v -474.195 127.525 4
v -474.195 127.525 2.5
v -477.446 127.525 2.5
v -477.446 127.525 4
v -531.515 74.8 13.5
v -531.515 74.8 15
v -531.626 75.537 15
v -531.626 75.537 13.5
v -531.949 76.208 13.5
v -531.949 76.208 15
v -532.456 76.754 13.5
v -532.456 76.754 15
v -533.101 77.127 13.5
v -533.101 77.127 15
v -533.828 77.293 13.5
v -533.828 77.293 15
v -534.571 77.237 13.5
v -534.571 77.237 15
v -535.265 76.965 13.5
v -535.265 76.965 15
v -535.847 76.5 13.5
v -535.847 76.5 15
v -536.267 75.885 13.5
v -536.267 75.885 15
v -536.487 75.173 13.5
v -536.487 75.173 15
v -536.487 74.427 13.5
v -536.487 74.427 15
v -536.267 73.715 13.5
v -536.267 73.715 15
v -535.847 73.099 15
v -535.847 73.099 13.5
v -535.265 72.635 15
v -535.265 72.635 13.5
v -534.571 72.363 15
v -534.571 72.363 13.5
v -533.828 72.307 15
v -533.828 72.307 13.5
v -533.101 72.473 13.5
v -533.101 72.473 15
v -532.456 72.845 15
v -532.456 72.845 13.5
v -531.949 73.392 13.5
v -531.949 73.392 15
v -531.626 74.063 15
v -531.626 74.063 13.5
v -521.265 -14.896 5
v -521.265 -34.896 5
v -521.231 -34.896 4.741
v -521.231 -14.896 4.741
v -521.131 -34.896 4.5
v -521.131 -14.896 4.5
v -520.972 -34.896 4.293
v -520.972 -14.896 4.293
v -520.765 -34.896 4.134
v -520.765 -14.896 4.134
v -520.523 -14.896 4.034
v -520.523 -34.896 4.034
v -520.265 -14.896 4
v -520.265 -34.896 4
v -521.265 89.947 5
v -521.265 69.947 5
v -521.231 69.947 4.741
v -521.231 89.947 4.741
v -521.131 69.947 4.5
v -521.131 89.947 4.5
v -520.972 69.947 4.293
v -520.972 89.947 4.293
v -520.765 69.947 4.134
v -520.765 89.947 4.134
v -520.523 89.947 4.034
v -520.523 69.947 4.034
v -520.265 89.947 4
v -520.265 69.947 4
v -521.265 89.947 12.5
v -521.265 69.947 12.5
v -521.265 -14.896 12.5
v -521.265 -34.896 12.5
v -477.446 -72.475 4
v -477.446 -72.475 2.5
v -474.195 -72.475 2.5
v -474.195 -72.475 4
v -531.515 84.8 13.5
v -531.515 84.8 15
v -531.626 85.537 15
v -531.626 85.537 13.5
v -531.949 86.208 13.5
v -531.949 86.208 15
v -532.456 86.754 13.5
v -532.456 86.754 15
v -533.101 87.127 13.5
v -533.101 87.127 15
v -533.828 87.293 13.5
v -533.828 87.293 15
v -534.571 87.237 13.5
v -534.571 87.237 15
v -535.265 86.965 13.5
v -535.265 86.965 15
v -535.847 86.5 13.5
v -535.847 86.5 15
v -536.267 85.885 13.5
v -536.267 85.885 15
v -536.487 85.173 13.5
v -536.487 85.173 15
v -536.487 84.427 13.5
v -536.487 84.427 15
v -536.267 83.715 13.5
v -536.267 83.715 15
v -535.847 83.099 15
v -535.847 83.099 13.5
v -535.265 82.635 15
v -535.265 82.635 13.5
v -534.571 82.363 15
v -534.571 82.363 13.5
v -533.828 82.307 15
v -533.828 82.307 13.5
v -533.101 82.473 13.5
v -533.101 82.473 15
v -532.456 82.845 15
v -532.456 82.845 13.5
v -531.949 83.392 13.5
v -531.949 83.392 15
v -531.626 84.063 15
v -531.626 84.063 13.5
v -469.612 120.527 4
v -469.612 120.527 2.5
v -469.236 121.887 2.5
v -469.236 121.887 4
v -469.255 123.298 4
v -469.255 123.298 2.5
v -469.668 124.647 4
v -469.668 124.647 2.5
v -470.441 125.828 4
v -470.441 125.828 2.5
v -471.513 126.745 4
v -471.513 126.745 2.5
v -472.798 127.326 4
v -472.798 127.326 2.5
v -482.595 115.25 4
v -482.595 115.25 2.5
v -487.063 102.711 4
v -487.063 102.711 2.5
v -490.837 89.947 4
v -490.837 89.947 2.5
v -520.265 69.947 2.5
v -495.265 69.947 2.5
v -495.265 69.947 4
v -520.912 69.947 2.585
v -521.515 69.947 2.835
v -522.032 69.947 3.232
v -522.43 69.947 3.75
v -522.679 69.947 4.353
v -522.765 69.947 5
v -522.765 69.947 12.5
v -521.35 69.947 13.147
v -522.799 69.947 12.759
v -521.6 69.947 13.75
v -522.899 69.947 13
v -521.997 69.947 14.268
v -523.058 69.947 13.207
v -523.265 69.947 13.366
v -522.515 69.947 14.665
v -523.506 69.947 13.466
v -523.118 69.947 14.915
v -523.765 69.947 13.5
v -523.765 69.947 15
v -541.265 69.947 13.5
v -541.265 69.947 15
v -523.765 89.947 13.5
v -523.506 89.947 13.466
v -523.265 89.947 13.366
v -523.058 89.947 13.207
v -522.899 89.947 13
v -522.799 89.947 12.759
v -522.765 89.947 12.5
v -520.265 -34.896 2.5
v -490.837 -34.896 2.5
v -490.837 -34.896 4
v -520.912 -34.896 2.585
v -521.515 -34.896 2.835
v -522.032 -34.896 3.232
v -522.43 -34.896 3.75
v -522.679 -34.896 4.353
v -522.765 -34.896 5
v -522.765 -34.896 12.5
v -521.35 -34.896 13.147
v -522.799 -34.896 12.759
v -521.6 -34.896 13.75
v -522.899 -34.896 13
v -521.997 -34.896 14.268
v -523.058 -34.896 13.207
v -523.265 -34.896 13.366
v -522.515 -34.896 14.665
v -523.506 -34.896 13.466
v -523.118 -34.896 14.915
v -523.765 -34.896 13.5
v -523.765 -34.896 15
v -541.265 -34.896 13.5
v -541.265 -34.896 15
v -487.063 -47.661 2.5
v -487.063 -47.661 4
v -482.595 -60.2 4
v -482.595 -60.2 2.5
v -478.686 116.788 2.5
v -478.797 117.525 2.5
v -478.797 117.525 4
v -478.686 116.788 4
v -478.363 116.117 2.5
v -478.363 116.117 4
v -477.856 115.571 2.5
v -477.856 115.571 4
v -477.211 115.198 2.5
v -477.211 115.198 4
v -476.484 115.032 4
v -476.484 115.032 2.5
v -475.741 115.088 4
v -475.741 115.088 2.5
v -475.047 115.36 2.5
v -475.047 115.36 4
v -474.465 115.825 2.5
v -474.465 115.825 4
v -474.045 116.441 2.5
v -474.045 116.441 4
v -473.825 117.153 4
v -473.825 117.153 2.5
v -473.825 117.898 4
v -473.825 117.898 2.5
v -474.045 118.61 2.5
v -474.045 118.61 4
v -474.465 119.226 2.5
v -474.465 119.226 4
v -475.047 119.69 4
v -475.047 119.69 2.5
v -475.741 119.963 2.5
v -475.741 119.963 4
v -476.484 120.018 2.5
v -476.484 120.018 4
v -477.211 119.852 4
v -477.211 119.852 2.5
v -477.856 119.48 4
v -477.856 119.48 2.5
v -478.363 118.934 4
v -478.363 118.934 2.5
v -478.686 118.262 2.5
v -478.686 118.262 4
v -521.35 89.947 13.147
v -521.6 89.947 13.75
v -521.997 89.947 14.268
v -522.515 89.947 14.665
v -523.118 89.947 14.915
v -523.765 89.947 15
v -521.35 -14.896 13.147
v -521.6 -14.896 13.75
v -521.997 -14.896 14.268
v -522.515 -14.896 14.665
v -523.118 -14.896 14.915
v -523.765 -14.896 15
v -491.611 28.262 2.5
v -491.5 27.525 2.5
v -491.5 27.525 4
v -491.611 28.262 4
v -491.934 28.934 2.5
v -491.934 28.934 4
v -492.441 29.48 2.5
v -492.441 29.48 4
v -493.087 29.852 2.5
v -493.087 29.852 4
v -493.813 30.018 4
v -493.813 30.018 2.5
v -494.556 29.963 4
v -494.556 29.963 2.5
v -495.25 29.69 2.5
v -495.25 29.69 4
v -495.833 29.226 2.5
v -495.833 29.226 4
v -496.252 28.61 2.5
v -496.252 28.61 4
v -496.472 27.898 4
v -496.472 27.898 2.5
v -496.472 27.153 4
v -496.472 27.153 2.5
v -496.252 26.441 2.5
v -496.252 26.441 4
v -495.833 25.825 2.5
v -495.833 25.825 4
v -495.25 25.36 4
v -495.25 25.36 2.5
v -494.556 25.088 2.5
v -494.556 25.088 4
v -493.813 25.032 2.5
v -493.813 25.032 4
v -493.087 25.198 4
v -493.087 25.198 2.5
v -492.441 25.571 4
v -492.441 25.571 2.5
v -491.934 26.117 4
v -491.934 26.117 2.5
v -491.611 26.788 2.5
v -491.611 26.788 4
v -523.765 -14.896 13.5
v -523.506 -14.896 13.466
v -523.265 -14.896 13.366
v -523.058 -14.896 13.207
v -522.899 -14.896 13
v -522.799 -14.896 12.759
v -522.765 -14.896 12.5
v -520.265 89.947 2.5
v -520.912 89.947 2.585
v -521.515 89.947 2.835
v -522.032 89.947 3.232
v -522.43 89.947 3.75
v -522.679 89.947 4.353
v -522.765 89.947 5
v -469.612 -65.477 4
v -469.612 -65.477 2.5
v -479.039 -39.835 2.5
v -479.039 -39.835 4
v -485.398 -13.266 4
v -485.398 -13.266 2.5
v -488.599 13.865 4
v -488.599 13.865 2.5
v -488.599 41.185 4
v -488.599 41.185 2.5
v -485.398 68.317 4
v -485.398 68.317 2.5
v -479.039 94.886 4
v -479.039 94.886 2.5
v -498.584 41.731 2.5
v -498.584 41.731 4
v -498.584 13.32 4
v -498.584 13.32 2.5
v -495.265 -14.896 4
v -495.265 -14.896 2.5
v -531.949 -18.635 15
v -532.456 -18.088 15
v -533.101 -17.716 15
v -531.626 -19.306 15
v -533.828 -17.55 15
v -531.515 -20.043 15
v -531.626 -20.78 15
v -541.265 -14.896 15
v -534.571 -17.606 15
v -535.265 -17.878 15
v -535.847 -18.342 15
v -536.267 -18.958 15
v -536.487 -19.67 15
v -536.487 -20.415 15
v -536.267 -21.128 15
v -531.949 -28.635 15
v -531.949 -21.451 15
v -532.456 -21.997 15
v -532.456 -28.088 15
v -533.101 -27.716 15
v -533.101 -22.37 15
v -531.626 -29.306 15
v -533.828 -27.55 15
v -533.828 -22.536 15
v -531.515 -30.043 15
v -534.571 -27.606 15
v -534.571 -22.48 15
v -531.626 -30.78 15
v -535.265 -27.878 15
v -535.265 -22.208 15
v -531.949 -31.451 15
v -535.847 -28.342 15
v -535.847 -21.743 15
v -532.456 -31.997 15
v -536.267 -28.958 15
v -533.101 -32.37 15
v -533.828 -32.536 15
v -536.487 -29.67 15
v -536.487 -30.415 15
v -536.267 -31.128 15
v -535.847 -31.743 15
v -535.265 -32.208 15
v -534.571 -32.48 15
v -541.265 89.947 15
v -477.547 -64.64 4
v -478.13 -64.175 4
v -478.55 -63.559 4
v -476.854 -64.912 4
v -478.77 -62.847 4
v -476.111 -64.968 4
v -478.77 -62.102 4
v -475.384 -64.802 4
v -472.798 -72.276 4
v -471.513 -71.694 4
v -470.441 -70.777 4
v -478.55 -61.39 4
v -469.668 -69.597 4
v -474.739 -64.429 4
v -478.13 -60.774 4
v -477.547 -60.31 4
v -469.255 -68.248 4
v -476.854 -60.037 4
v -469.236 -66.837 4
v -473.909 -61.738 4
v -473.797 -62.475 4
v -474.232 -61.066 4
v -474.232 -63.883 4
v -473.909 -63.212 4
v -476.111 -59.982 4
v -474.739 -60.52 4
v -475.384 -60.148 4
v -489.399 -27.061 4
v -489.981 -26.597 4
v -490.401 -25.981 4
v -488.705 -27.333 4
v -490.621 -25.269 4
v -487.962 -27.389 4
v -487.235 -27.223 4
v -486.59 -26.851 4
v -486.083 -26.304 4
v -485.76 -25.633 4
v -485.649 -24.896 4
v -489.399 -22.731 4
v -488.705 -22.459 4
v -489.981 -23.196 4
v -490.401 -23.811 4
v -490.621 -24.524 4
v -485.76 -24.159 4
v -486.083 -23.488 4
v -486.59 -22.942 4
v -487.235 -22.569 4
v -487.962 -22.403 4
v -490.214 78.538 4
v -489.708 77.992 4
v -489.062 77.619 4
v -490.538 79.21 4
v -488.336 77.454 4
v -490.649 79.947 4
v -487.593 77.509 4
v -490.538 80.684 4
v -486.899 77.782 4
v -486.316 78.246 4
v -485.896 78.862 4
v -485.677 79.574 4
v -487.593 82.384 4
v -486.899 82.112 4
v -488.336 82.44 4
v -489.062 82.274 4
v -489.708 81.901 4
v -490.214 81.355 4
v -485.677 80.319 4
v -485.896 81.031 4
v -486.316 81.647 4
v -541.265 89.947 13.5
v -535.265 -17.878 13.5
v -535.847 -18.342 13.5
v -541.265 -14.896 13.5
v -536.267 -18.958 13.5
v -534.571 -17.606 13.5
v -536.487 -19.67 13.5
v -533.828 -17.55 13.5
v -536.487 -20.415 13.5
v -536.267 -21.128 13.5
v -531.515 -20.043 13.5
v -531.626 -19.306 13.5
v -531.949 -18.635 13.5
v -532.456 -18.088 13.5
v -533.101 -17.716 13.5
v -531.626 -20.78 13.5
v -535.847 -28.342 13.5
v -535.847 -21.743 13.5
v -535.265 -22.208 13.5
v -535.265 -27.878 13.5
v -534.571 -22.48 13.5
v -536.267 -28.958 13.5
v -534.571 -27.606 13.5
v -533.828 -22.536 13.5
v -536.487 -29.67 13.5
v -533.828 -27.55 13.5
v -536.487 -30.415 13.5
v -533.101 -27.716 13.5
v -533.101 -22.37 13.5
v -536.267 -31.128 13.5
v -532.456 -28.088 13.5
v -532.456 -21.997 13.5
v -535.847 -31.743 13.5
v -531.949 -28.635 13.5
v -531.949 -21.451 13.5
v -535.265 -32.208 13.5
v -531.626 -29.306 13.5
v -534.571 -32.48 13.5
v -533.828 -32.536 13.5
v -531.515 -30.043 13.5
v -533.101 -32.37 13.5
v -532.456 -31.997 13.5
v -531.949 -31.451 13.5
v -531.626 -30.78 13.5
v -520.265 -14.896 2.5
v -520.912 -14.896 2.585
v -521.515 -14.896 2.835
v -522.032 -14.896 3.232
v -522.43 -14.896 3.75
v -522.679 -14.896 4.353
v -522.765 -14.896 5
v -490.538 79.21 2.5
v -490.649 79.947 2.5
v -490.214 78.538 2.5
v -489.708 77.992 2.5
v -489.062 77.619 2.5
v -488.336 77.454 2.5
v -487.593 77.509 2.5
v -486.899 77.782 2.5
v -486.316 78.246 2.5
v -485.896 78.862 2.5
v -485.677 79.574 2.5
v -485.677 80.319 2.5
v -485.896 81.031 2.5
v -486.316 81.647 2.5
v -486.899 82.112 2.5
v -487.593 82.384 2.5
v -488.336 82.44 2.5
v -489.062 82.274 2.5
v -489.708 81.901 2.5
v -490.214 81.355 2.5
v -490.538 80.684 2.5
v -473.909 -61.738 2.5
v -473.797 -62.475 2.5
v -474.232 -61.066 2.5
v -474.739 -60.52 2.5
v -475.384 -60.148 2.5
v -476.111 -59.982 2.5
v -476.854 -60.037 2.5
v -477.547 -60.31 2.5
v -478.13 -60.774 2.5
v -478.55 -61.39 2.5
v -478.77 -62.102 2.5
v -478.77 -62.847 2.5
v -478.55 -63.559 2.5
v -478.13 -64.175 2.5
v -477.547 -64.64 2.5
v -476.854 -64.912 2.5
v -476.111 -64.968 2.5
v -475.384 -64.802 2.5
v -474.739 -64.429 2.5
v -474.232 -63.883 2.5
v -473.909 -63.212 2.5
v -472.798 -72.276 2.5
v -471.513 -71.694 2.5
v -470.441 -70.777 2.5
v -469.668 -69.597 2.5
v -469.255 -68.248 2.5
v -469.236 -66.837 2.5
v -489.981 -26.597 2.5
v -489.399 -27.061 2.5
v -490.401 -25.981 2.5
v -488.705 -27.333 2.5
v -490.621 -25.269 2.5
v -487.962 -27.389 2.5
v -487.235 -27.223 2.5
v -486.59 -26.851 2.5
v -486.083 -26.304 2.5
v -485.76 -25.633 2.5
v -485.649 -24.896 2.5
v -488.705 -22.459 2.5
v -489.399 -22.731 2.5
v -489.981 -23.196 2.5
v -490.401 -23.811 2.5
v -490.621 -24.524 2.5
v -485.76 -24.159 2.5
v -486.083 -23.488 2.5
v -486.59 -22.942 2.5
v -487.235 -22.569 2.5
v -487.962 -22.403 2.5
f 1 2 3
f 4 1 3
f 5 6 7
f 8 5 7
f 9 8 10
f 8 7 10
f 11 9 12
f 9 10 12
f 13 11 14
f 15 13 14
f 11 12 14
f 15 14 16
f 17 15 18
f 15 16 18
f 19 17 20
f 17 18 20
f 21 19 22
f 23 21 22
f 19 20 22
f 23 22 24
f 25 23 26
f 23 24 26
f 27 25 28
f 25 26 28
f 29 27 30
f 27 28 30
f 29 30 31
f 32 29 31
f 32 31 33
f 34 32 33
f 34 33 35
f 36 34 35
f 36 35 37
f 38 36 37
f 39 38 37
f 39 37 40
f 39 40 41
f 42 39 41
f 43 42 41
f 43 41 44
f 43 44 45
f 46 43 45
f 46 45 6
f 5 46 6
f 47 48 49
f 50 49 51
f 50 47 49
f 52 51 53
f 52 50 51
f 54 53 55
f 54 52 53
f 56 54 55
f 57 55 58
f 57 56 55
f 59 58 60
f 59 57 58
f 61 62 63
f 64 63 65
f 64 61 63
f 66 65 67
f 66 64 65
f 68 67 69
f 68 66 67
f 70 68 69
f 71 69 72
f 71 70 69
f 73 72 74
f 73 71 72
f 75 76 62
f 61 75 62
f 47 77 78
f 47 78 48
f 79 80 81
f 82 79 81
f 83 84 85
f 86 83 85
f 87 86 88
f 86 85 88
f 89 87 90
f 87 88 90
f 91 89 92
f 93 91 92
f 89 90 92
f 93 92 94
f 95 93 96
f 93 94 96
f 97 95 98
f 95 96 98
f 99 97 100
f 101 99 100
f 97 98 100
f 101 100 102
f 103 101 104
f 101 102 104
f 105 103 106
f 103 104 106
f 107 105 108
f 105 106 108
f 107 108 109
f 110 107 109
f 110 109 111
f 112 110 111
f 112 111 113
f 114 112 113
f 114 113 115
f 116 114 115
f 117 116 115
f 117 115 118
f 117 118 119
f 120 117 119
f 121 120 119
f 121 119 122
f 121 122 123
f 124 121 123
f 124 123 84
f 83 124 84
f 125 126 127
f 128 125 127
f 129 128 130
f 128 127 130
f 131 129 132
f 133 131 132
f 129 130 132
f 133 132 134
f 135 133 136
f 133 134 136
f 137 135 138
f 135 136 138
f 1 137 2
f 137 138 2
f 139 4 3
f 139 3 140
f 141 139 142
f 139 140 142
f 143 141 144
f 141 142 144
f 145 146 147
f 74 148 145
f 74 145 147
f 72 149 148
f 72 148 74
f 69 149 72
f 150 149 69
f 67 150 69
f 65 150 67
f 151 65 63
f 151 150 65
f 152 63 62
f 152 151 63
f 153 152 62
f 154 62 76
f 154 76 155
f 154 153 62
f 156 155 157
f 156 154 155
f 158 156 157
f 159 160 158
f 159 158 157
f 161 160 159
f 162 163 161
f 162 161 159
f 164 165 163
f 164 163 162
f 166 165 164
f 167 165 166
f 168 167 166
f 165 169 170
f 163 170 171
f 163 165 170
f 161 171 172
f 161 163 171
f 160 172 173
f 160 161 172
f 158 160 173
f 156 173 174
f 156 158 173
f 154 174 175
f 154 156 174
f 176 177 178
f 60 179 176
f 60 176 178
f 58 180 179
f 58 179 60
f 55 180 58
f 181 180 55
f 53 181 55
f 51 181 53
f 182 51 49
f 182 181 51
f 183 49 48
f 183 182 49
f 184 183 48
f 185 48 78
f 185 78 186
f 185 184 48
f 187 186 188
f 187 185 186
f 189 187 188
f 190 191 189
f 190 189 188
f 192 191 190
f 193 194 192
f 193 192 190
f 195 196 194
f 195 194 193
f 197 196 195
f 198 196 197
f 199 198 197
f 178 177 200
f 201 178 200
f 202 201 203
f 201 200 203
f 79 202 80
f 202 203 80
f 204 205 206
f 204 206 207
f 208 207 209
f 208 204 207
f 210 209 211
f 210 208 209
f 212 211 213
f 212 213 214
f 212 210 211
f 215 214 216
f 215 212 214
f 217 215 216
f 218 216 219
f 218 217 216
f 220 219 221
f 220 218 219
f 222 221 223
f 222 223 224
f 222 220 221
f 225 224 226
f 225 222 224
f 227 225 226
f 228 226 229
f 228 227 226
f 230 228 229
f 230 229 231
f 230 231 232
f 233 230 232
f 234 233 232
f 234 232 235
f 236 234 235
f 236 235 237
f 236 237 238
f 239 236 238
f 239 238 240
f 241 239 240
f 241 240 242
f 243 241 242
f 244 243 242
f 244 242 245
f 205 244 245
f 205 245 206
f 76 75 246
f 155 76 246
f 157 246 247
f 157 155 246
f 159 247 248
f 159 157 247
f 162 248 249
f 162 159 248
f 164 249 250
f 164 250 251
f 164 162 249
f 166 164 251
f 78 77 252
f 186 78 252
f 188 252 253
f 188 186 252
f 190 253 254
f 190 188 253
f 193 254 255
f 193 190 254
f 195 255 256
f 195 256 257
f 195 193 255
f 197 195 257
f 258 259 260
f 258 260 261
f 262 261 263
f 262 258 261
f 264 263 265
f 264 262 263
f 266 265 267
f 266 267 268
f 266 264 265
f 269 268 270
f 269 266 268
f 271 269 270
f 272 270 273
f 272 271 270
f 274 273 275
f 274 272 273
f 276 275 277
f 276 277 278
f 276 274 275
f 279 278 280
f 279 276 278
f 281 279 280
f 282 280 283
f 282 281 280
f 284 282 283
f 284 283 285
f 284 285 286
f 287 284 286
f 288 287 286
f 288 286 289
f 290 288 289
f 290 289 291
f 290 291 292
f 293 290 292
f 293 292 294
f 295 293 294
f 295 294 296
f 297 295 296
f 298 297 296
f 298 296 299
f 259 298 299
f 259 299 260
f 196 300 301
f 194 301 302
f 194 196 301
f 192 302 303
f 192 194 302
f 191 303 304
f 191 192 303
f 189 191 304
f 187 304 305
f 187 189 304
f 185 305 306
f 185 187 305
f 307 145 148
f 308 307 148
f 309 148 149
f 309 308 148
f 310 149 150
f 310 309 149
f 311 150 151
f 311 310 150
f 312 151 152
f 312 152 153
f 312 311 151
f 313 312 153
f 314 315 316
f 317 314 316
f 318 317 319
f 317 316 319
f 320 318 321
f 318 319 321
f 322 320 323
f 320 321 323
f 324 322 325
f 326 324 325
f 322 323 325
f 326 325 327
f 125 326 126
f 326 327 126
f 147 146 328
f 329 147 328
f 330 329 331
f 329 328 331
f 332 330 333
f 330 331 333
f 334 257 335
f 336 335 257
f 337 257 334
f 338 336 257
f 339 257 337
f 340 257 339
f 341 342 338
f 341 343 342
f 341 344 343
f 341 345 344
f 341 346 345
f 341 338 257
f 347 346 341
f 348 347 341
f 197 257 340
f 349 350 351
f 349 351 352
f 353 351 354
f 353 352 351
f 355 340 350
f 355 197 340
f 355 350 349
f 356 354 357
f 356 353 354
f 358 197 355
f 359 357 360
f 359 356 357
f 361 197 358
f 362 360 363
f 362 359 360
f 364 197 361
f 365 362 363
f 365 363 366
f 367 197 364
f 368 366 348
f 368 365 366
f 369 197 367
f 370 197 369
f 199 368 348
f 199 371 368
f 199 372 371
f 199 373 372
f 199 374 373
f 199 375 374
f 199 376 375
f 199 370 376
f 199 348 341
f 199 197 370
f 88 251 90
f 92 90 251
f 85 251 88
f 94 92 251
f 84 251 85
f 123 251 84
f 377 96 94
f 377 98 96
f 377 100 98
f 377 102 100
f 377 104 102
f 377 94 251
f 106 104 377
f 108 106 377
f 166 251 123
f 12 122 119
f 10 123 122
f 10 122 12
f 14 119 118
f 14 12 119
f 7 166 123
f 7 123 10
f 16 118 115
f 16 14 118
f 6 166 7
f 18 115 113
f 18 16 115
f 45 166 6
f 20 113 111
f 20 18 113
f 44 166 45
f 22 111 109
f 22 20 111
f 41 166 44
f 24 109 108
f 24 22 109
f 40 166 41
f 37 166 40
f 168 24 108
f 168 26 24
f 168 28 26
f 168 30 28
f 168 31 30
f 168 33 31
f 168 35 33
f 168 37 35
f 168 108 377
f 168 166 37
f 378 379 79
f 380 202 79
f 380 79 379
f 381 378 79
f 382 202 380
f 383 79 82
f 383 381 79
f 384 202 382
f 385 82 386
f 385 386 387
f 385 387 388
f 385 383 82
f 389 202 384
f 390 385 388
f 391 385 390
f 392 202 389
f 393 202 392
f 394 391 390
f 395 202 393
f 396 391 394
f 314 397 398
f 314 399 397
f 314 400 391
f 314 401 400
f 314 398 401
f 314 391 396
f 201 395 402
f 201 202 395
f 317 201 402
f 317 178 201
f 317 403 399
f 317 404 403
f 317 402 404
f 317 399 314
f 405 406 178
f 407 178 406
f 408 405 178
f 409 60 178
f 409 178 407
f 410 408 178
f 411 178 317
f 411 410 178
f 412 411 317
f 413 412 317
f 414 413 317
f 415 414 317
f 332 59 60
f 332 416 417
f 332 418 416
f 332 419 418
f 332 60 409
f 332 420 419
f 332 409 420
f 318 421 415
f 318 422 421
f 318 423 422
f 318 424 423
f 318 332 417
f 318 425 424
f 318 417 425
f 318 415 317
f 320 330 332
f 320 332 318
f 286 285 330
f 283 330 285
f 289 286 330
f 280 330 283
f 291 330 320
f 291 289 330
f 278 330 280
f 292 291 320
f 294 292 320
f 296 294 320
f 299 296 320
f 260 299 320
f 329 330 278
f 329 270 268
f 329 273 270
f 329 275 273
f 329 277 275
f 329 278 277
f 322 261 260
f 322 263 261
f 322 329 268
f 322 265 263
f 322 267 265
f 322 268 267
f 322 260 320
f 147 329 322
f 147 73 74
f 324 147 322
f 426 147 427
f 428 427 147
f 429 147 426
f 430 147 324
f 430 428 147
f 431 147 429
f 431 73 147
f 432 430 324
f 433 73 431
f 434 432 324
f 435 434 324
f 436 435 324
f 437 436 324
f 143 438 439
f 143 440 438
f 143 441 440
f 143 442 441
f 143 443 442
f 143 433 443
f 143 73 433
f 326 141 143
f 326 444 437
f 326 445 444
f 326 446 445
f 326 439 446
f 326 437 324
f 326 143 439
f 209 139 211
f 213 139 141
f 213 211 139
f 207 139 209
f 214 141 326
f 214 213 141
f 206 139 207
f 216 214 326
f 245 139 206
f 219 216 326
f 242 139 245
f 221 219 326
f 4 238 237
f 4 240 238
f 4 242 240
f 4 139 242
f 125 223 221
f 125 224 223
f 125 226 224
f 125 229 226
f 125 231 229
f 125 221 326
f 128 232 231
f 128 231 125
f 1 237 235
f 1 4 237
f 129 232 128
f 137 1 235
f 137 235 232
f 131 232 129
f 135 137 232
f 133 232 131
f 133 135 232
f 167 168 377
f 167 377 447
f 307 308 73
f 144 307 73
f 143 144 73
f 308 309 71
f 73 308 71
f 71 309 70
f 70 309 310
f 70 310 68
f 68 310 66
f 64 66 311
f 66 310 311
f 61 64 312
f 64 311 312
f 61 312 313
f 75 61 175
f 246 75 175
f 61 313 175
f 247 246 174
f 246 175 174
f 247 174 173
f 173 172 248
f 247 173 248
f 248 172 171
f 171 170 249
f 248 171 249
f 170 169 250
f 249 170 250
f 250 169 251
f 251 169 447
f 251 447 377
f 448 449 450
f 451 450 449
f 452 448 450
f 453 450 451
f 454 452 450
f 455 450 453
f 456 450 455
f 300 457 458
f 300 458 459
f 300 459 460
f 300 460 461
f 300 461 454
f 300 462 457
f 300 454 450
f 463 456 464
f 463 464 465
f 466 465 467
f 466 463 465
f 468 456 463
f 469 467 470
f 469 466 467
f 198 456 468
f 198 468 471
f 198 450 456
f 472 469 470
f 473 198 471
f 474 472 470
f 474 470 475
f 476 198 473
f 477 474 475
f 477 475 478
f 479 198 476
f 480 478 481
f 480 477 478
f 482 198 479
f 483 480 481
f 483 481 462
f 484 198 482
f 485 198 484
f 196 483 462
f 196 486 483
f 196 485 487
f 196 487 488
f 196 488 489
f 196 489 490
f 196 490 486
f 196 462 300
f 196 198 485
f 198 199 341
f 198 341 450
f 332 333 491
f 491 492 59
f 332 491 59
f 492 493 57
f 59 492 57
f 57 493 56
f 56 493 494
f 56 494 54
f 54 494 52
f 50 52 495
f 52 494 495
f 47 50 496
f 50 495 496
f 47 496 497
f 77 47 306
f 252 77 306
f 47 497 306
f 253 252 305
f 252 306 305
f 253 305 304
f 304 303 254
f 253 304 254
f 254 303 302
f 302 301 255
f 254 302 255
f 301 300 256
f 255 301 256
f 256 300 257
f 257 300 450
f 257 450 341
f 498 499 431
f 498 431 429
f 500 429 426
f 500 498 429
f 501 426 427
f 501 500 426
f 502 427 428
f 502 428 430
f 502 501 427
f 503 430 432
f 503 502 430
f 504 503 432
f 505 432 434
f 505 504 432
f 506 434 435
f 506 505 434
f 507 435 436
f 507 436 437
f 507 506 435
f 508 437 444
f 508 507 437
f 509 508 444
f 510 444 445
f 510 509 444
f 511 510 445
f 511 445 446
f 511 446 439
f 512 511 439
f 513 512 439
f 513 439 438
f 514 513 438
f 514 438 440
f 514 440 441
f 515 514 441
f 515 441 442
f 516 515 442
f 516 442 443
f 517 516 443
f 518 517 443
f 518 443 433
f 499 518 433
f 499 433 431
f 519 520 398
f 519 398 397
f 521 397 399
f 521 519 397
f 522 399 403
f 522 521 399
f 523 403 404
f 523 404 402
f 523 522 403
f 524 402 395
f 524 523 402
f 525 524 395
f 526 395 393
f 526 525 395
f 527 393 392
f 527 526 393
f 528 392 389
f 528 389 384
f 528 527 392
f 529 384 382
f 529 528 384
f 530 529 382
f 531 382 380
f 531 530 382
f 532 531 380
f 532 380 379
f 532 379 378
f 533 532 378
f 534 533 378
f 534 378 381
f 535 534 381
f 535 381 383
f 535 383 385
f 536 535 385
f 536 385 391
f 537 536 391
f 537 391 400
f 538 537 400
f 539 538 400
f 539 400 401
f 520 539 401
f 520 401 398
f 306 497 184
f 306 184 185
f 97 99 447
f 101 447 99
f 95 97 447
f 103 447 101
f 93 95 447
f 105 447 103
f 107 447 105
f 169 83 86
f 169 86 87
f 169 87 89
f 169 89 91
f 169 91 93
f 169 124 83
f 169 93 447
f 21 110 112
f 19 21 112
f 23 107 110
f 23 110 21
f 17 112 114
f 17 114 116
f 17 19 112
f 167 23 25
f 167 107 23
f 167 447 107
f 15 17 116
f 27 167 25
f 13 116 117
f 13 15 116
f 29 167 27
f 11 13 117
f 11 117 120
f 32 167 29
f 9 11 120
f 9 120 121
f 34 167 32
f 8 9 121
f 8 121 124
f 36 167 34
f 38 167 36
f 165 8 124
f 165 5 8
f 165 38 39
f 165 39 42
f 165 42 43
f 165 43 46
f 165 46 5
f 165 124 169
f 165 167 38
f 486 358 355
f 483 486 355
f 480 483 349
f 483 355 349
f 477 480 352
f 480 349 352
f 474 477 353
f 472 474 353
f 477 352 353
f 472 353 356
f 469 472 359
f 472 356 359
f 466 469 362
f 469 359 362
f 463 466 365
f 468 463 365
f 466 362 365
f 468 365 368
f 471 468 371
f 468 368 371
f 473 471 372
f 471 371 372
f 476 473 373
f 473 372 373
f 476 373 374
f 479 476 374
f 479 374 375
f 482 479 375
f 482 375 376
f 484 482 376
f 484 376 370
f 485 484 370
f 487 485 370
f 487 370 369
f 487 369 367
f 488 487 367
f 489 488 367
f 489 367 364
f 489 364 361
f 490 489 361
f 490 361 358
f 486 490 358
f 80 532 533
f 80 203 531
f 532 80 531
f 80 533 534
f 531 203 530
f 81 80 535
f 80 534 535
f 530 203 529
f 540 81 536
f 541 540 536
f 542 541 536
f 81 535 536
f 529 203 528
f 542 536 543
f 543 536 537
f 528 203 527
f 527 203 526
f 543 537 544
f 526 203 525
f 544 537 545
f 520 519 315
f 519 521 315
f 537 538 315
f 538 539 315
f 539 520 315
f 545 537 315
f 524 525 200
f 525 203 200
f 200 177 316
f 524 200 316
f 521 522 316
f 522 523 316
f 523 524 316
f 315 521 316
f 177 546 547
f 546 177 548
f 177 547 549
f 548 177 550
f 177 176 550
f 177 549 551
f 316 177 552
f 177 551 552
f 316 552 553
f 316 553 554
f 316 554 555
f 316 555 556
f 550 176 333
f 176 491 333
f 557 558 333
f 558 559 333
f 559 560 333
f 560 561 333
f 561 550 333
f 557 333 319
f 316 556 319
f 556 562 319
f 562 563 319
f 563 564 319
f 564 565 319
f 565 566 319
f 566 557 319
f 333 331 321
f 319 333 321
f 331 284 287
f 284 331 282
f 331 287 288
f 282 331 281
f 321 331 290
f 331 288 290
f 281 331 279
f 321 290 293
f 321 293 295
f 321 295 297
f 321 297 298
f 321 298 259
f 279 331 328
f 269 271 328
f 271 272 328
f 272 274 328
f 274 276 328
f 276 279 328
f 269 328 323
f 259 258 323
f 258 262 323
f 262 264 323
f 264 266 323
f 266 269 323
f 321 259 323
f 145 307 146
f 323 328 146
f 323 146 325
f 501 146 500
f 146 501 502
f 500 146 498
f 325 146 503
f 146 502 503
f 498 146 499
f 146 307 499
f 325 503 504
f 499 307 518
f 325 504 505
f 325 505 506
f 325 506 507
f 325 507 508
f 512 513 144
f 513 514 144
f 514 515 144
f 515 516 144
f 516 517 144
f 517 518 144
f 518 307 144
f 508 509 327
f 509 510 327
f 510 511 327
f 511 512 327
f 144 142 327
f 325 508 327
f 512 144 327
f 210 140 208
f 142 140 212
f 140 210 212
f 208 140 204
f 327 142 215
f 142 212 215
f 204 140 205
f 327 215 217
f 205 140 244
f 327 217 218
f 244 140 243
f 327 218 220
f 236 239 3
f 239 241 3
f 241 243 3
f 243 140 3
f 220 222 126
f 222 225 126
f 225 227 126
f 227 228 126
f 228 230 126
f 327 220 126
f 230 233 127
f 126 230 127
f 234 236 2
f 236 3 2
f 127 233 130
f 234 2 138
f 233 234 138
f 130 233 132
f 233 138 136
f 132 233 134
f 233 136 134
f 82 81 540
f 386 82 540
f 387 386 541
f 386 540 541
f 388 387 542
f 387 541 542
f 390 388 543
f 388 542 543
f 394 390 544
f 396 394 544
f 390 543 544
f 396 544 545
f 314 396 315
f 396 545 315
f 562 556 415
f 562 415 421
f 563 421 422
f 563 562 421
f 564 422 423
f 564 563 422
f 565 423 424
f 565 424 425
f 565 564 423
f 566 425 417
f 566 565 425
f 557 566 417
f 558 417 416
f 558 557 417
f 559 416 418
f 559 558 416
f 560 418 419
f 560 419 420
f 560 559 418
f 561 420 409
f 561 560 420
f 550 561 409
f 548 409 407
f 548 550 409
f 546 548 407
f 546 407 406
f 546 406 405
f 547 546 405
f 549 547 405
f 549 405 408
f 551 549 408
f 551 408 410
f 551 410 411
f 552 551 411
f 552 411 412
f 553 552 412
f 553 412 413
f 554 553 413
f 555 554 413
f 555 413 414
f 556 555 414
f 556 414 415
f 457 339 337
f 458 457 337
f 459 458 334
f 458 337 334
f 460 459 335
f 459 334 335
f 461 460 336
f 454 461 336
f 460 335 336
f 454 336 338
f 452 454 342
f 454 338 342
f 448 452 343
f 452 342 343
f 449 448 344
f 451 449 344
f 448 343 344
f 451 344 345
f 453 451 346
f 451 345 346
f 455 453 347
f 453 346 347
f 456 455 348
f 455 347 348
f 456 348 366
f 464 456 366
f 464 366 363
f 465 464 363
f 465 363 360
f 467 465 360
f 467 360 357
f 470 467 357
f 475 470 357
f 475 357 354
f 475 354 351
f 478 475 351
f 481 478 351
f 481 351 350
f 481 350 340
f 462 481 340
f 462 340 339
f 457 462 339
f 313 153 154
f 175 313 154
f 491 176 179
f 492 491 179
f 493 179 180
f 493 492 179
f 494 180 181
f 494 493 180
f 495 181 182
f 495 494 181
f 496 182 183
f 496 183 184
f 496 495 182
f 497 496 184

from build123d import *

# Parameters (mm, degrees)
SKETCH1_R                = 2.5
BOSS_EXTRUDE1_DEPTH      = 4
CONVERT_SOLID1_OUTLINE_R = 2.5
CONVERT_SOLID1_DEPTH     = 2.5
EDGE_FLANGE1_DEPTH       = 20
EDGE_FLANGE1_BEND_DEPTH  = 20
EDGE_FLANGE2_DEPTH       = 20
EDGE_FLANGE2_BEND_DEPTH  = 20
SKETCH14_R               = 2.5
CUT_EXTRUDE1_DEPTH       = 4


# Read off the part's stored shape, not the designer's step: Convert-Solid1
# Sheet-metal steps are written as plain solids
with BuildPart() as part:
    # Sketch1 → Boss-Extrude1 (new body)
    with BuildSketch(Plane.XY):
        with BuildLine():
            Line((-474.195090562, 127.525252525), (-477.445756062, 127.525252525))
            ThreePointArc((-477.445756062, 127.525252525), (-484.91471638, 109.01150893), (-490.83715139, 89.946650322))
            Line((-490.83715139, 89.946650322), (-520.264617773, 89.946650322))
            Line((-520.264617773, 89.946650322), (-520.264617773, 69.946650322))
            Line((-520.264617773, 69.946650322), (-495.264617773, 69.946650322))
            ThreePointArc((-495.264617773, 69.946650322), (-499, 27.525252525), (-495.264617773, -14.896145272))
            Line((-495.264617773, -14.896145272), (-520.264617773, -14.896145272))
            Line((-520.264617773, -14.896145272), (-520.264617773, -34.896145272))
            Line((-520.264617773, -34.896145272), (-490.83715139, -34.896145272))
            ThreePointArc((-490.83715139, -34.896145272), (-484.91471638, -53.961003879), (-477.445756062, -72.474747475))
            Line((-477.445756062, -72.474747475), (-474.195090562, -72.474747475))
            ThreePointArc((-474.195090562, -72.474747475), (-470.012418883, -70.21432), (-469.611597595, -65.476850524))
            ThreePointArc((-469.611597595, -65.476850524), (-489, 27.525252525), (-469.611597595, 120.527355575))
            ThreePointArc((-469.611597595, 120.527355575), (-470.012418883, 125.264825051), (-474.195090562, 127.525252525))
        make_face()
        with Locations(Location((-488.148813177, 79.946650322, 0), (0, 0, 180))):
            Circle(SKETCH1_R, mode=Mode.SUBTRACT)
        with Locations((-494, 27.525252525)):
            Circle(SKETCH1_R, mode=Mode.SUBTRACT)
        with Locations((-488.148813177, -24.896145272)):
            Circle(SKETCH1_R, mode=Mode.SUBTRACT)
        with Locations((-476.297445473, -62.474747475)):
            Circle(SKETCH1_R, mode=Mode.SUBTRACT)
        with Locations(Location((-476.297445473, 117.525252525, 0), (0, 0, 180))):
            Circle(SKETCH1_R, mode=Mode.SUBTRACT)
    extrude(amount=BOSS_EXTRUDE1_DEPTH)

    # Convert-Solid1 outline → Convert-Solid1 (cut)
    with BuildSketch(Plane.XY):
        with BuildLine():
            ThreePointArc((-490.83715139, -34.896145272), (-484.91471638, -53.961003879), (-477.445756062, -72.474747475))
            Line((-477.445756062, -72.474747475), (-474.195090562, -72.474747475))
            ThreePointArc((-474.195090562, -72.474747475), (-470.012418883, -70.21432), (-469.611597595, -65.476850524))
            ThreePointArc((-469.611597595, -65.476850524), (-489, 27.525252525), (-469.611597595, 120.527355575))
            ThreePointArc((-469.611597595, 120.527355575), (-470.012418883, 125.264825051), (-474.195090562, 127.525252525))
            Line((-474.195090562, 127.525252525), (-477.445756062, 127.525252525))
            ThreePointArc((-477.445756062, 127.525252525), (-484.91471638, 109.011508929), (-490.83715139, 89.946650322))
            Line((-490.83715139, 89.946650322), (-520.264617773, 89.946650322))
            Line((-520.264617773, 89.946650322), (-520.264617773, 69.946650322))
            Line((-520.264617773, 69.946650322), (-495.264617773, 69.946650322))
            ThreePointArc((-495.264617773, 69.946650322), (-499, 27.525252525), (-495.264617773, -14.896145272))
            Line((-495.264617773, -14.896145272), (-520.264617773, -14.896145272))
            Line((-520.264617773, -14.896145272), (-520.264617773, -34.896145272))
            Line((-520.264617773, -34.896145272), (-490.83715139, -34.896145272))
        make_face()
        with Locations((-488.148813177, -24.896145272)):
            Circle(CONVERT_SOLID1_OUTLINE_R, mode=Mode.SUBTRACT)
        with Locations((-476.297445473, -62.474747475)):
            Circle(CONVERT_SOLID1_OUTLINE_R, mode=Mode.SUBTRACT)
        with Locations((-494, 27.525252525)):
            Circle(CONVERT_SOLID1_OUTLINE_R, mode=Mode.SUBTRACT)
        with Locations((-488.148813177, 79.946650322)):
            Circle(CONVERT_SOLID1_OUTLINE_R, mode=Mode.SUBTRACT)
        with Locations((-476.297445473, 117.525252525)):
            Circle(CONVERT_SOLID1_OUTLINE_R, mode=Mode.SUBTRACT)
    extrude(amount=CONVERT_SOLID1_DEPTH, mode=Mode.SUBTRACT)

    # Edge-Flange1 section (across the edge) → Edge-Flange1 (add)
    with BuildSketch(Plane(origin=(-521.264617773, 89.946650322, 4), x_dir=(1, 0, 0), z_dir=(0, -1, 0))):
        with BuildLine():
            Line((-1.5, 1), (-1.5, 8.5))
            Line((-1.5, 8.5), (0, 8.5))
            Line((0, 8.5), (0, 1))
            ThreePointArc((0, 1), (0.292893219, 0.292893219), (1, 0))
            Line((1, 0), (1, -1.5))
            ThreePointArc((1, -1.5), (-0.767766953, -0.767766953), (-1.5, 1))
        make_face()
    extrude(amount=EDGE_FLANGE1_DEPTH)

    # Edge-Flange1 section 2 (across the edge) → Edge-Flange1 bend (add)
    with BuildSketch(Plane(origin=(-521.264617773, -14.896145272, 4), x_dir=(1, 0, 0), z_dir=(0, -1, 0))):
        with BuildLine():
            Line((-1.5, 1), (-1.5, 8.5))
            Line((-1.5, 8.5), (0, 8.5))
            Line((0, 8.5), (0, 1))
            ThreePointArc((0, 1), (0.292893219, 0.292893219), (1, 0))
            Line((1, 0), (1, -1.5))
            ThreePointArc((1, -1.5), (-0.767766953, -0.767766953), (-1.5, 1))
        make_face()
    extrude(amount=EDGE_FLANGE1_BEND_DEPTH)

    # Edge-Flange2 section (across the edge) → Edge-Flange2 (add)
    with BuildSketch(Plane(origin=(-522.764617773, 69.946650322, 13.5), x_dir=(0, 0, -1), z_dir=(0, 1, 0))):
        with BuildLine():
            Line((-1.5, 1), (-1.5, 18.5))
            Line((-1.5, 18.5), (0, 18.5))
            Line((0, 18.5), (0, 1))
            ThreePointArc((0, 1), (0.292893219, 0.292893219), (1, 0))
            Line((1, 0), (1, -1.5))
            ThreePointArc((1, -1.5), (-0.767766953, -0.767766953), (-1.5, 1))
        make_face()
    extrude(amount=EDGE_FLANGE2_DEPTH)

    # Edge-Flange2 section 2 (across the edge) → Edge-Flange2 bend (add)
    with BuildSketch(Plane(origin=(-522.764617773, -34.896145272, 13.5), x_dir=(0, 0, -1), z_dir=(0, 1, 0))):
        with BuildLine():
            Line((-1.5, 1), (-1.5, 18.5))
            Line((-1.5, 18.5), (0, 18.5))
            Line((0, 18.5), (0, 1))
            ThreePointArc((0, 1), (0.292893219, 0.292893219), (1, 0))
            Line((1, 0), (1, -1.5))
            ThreePointArc((1, -1.5), (-0.767766953, -0.767766953), (-1.5, 1))
        make_face()
    extrude(amount=EDGE_FLANGE2_BEND_DEPTH)

    # Sketch14 → Cut-Extrude1 (cut)
    with BuildSketch(Plane.XY.offset(15)):
        with Locations((-534.014617773, 74.799905576)):
            Circle(SKETCH14_R)
        with Locations((-534.014617773, -20.042890014)):
            Circle(SKETCH14_R)
        with Locations((-534.014617773, -30.042890014)):
            Circle(SKETCH14_R)
        with Locations((-534.014617773, 84.799905576)):
            Circle(SKETCH14_R)
    extrude(amount=-CUT_EXTRUDE1_DEPTH, mode=Mode.SUBTRACT)


solid = part.part
